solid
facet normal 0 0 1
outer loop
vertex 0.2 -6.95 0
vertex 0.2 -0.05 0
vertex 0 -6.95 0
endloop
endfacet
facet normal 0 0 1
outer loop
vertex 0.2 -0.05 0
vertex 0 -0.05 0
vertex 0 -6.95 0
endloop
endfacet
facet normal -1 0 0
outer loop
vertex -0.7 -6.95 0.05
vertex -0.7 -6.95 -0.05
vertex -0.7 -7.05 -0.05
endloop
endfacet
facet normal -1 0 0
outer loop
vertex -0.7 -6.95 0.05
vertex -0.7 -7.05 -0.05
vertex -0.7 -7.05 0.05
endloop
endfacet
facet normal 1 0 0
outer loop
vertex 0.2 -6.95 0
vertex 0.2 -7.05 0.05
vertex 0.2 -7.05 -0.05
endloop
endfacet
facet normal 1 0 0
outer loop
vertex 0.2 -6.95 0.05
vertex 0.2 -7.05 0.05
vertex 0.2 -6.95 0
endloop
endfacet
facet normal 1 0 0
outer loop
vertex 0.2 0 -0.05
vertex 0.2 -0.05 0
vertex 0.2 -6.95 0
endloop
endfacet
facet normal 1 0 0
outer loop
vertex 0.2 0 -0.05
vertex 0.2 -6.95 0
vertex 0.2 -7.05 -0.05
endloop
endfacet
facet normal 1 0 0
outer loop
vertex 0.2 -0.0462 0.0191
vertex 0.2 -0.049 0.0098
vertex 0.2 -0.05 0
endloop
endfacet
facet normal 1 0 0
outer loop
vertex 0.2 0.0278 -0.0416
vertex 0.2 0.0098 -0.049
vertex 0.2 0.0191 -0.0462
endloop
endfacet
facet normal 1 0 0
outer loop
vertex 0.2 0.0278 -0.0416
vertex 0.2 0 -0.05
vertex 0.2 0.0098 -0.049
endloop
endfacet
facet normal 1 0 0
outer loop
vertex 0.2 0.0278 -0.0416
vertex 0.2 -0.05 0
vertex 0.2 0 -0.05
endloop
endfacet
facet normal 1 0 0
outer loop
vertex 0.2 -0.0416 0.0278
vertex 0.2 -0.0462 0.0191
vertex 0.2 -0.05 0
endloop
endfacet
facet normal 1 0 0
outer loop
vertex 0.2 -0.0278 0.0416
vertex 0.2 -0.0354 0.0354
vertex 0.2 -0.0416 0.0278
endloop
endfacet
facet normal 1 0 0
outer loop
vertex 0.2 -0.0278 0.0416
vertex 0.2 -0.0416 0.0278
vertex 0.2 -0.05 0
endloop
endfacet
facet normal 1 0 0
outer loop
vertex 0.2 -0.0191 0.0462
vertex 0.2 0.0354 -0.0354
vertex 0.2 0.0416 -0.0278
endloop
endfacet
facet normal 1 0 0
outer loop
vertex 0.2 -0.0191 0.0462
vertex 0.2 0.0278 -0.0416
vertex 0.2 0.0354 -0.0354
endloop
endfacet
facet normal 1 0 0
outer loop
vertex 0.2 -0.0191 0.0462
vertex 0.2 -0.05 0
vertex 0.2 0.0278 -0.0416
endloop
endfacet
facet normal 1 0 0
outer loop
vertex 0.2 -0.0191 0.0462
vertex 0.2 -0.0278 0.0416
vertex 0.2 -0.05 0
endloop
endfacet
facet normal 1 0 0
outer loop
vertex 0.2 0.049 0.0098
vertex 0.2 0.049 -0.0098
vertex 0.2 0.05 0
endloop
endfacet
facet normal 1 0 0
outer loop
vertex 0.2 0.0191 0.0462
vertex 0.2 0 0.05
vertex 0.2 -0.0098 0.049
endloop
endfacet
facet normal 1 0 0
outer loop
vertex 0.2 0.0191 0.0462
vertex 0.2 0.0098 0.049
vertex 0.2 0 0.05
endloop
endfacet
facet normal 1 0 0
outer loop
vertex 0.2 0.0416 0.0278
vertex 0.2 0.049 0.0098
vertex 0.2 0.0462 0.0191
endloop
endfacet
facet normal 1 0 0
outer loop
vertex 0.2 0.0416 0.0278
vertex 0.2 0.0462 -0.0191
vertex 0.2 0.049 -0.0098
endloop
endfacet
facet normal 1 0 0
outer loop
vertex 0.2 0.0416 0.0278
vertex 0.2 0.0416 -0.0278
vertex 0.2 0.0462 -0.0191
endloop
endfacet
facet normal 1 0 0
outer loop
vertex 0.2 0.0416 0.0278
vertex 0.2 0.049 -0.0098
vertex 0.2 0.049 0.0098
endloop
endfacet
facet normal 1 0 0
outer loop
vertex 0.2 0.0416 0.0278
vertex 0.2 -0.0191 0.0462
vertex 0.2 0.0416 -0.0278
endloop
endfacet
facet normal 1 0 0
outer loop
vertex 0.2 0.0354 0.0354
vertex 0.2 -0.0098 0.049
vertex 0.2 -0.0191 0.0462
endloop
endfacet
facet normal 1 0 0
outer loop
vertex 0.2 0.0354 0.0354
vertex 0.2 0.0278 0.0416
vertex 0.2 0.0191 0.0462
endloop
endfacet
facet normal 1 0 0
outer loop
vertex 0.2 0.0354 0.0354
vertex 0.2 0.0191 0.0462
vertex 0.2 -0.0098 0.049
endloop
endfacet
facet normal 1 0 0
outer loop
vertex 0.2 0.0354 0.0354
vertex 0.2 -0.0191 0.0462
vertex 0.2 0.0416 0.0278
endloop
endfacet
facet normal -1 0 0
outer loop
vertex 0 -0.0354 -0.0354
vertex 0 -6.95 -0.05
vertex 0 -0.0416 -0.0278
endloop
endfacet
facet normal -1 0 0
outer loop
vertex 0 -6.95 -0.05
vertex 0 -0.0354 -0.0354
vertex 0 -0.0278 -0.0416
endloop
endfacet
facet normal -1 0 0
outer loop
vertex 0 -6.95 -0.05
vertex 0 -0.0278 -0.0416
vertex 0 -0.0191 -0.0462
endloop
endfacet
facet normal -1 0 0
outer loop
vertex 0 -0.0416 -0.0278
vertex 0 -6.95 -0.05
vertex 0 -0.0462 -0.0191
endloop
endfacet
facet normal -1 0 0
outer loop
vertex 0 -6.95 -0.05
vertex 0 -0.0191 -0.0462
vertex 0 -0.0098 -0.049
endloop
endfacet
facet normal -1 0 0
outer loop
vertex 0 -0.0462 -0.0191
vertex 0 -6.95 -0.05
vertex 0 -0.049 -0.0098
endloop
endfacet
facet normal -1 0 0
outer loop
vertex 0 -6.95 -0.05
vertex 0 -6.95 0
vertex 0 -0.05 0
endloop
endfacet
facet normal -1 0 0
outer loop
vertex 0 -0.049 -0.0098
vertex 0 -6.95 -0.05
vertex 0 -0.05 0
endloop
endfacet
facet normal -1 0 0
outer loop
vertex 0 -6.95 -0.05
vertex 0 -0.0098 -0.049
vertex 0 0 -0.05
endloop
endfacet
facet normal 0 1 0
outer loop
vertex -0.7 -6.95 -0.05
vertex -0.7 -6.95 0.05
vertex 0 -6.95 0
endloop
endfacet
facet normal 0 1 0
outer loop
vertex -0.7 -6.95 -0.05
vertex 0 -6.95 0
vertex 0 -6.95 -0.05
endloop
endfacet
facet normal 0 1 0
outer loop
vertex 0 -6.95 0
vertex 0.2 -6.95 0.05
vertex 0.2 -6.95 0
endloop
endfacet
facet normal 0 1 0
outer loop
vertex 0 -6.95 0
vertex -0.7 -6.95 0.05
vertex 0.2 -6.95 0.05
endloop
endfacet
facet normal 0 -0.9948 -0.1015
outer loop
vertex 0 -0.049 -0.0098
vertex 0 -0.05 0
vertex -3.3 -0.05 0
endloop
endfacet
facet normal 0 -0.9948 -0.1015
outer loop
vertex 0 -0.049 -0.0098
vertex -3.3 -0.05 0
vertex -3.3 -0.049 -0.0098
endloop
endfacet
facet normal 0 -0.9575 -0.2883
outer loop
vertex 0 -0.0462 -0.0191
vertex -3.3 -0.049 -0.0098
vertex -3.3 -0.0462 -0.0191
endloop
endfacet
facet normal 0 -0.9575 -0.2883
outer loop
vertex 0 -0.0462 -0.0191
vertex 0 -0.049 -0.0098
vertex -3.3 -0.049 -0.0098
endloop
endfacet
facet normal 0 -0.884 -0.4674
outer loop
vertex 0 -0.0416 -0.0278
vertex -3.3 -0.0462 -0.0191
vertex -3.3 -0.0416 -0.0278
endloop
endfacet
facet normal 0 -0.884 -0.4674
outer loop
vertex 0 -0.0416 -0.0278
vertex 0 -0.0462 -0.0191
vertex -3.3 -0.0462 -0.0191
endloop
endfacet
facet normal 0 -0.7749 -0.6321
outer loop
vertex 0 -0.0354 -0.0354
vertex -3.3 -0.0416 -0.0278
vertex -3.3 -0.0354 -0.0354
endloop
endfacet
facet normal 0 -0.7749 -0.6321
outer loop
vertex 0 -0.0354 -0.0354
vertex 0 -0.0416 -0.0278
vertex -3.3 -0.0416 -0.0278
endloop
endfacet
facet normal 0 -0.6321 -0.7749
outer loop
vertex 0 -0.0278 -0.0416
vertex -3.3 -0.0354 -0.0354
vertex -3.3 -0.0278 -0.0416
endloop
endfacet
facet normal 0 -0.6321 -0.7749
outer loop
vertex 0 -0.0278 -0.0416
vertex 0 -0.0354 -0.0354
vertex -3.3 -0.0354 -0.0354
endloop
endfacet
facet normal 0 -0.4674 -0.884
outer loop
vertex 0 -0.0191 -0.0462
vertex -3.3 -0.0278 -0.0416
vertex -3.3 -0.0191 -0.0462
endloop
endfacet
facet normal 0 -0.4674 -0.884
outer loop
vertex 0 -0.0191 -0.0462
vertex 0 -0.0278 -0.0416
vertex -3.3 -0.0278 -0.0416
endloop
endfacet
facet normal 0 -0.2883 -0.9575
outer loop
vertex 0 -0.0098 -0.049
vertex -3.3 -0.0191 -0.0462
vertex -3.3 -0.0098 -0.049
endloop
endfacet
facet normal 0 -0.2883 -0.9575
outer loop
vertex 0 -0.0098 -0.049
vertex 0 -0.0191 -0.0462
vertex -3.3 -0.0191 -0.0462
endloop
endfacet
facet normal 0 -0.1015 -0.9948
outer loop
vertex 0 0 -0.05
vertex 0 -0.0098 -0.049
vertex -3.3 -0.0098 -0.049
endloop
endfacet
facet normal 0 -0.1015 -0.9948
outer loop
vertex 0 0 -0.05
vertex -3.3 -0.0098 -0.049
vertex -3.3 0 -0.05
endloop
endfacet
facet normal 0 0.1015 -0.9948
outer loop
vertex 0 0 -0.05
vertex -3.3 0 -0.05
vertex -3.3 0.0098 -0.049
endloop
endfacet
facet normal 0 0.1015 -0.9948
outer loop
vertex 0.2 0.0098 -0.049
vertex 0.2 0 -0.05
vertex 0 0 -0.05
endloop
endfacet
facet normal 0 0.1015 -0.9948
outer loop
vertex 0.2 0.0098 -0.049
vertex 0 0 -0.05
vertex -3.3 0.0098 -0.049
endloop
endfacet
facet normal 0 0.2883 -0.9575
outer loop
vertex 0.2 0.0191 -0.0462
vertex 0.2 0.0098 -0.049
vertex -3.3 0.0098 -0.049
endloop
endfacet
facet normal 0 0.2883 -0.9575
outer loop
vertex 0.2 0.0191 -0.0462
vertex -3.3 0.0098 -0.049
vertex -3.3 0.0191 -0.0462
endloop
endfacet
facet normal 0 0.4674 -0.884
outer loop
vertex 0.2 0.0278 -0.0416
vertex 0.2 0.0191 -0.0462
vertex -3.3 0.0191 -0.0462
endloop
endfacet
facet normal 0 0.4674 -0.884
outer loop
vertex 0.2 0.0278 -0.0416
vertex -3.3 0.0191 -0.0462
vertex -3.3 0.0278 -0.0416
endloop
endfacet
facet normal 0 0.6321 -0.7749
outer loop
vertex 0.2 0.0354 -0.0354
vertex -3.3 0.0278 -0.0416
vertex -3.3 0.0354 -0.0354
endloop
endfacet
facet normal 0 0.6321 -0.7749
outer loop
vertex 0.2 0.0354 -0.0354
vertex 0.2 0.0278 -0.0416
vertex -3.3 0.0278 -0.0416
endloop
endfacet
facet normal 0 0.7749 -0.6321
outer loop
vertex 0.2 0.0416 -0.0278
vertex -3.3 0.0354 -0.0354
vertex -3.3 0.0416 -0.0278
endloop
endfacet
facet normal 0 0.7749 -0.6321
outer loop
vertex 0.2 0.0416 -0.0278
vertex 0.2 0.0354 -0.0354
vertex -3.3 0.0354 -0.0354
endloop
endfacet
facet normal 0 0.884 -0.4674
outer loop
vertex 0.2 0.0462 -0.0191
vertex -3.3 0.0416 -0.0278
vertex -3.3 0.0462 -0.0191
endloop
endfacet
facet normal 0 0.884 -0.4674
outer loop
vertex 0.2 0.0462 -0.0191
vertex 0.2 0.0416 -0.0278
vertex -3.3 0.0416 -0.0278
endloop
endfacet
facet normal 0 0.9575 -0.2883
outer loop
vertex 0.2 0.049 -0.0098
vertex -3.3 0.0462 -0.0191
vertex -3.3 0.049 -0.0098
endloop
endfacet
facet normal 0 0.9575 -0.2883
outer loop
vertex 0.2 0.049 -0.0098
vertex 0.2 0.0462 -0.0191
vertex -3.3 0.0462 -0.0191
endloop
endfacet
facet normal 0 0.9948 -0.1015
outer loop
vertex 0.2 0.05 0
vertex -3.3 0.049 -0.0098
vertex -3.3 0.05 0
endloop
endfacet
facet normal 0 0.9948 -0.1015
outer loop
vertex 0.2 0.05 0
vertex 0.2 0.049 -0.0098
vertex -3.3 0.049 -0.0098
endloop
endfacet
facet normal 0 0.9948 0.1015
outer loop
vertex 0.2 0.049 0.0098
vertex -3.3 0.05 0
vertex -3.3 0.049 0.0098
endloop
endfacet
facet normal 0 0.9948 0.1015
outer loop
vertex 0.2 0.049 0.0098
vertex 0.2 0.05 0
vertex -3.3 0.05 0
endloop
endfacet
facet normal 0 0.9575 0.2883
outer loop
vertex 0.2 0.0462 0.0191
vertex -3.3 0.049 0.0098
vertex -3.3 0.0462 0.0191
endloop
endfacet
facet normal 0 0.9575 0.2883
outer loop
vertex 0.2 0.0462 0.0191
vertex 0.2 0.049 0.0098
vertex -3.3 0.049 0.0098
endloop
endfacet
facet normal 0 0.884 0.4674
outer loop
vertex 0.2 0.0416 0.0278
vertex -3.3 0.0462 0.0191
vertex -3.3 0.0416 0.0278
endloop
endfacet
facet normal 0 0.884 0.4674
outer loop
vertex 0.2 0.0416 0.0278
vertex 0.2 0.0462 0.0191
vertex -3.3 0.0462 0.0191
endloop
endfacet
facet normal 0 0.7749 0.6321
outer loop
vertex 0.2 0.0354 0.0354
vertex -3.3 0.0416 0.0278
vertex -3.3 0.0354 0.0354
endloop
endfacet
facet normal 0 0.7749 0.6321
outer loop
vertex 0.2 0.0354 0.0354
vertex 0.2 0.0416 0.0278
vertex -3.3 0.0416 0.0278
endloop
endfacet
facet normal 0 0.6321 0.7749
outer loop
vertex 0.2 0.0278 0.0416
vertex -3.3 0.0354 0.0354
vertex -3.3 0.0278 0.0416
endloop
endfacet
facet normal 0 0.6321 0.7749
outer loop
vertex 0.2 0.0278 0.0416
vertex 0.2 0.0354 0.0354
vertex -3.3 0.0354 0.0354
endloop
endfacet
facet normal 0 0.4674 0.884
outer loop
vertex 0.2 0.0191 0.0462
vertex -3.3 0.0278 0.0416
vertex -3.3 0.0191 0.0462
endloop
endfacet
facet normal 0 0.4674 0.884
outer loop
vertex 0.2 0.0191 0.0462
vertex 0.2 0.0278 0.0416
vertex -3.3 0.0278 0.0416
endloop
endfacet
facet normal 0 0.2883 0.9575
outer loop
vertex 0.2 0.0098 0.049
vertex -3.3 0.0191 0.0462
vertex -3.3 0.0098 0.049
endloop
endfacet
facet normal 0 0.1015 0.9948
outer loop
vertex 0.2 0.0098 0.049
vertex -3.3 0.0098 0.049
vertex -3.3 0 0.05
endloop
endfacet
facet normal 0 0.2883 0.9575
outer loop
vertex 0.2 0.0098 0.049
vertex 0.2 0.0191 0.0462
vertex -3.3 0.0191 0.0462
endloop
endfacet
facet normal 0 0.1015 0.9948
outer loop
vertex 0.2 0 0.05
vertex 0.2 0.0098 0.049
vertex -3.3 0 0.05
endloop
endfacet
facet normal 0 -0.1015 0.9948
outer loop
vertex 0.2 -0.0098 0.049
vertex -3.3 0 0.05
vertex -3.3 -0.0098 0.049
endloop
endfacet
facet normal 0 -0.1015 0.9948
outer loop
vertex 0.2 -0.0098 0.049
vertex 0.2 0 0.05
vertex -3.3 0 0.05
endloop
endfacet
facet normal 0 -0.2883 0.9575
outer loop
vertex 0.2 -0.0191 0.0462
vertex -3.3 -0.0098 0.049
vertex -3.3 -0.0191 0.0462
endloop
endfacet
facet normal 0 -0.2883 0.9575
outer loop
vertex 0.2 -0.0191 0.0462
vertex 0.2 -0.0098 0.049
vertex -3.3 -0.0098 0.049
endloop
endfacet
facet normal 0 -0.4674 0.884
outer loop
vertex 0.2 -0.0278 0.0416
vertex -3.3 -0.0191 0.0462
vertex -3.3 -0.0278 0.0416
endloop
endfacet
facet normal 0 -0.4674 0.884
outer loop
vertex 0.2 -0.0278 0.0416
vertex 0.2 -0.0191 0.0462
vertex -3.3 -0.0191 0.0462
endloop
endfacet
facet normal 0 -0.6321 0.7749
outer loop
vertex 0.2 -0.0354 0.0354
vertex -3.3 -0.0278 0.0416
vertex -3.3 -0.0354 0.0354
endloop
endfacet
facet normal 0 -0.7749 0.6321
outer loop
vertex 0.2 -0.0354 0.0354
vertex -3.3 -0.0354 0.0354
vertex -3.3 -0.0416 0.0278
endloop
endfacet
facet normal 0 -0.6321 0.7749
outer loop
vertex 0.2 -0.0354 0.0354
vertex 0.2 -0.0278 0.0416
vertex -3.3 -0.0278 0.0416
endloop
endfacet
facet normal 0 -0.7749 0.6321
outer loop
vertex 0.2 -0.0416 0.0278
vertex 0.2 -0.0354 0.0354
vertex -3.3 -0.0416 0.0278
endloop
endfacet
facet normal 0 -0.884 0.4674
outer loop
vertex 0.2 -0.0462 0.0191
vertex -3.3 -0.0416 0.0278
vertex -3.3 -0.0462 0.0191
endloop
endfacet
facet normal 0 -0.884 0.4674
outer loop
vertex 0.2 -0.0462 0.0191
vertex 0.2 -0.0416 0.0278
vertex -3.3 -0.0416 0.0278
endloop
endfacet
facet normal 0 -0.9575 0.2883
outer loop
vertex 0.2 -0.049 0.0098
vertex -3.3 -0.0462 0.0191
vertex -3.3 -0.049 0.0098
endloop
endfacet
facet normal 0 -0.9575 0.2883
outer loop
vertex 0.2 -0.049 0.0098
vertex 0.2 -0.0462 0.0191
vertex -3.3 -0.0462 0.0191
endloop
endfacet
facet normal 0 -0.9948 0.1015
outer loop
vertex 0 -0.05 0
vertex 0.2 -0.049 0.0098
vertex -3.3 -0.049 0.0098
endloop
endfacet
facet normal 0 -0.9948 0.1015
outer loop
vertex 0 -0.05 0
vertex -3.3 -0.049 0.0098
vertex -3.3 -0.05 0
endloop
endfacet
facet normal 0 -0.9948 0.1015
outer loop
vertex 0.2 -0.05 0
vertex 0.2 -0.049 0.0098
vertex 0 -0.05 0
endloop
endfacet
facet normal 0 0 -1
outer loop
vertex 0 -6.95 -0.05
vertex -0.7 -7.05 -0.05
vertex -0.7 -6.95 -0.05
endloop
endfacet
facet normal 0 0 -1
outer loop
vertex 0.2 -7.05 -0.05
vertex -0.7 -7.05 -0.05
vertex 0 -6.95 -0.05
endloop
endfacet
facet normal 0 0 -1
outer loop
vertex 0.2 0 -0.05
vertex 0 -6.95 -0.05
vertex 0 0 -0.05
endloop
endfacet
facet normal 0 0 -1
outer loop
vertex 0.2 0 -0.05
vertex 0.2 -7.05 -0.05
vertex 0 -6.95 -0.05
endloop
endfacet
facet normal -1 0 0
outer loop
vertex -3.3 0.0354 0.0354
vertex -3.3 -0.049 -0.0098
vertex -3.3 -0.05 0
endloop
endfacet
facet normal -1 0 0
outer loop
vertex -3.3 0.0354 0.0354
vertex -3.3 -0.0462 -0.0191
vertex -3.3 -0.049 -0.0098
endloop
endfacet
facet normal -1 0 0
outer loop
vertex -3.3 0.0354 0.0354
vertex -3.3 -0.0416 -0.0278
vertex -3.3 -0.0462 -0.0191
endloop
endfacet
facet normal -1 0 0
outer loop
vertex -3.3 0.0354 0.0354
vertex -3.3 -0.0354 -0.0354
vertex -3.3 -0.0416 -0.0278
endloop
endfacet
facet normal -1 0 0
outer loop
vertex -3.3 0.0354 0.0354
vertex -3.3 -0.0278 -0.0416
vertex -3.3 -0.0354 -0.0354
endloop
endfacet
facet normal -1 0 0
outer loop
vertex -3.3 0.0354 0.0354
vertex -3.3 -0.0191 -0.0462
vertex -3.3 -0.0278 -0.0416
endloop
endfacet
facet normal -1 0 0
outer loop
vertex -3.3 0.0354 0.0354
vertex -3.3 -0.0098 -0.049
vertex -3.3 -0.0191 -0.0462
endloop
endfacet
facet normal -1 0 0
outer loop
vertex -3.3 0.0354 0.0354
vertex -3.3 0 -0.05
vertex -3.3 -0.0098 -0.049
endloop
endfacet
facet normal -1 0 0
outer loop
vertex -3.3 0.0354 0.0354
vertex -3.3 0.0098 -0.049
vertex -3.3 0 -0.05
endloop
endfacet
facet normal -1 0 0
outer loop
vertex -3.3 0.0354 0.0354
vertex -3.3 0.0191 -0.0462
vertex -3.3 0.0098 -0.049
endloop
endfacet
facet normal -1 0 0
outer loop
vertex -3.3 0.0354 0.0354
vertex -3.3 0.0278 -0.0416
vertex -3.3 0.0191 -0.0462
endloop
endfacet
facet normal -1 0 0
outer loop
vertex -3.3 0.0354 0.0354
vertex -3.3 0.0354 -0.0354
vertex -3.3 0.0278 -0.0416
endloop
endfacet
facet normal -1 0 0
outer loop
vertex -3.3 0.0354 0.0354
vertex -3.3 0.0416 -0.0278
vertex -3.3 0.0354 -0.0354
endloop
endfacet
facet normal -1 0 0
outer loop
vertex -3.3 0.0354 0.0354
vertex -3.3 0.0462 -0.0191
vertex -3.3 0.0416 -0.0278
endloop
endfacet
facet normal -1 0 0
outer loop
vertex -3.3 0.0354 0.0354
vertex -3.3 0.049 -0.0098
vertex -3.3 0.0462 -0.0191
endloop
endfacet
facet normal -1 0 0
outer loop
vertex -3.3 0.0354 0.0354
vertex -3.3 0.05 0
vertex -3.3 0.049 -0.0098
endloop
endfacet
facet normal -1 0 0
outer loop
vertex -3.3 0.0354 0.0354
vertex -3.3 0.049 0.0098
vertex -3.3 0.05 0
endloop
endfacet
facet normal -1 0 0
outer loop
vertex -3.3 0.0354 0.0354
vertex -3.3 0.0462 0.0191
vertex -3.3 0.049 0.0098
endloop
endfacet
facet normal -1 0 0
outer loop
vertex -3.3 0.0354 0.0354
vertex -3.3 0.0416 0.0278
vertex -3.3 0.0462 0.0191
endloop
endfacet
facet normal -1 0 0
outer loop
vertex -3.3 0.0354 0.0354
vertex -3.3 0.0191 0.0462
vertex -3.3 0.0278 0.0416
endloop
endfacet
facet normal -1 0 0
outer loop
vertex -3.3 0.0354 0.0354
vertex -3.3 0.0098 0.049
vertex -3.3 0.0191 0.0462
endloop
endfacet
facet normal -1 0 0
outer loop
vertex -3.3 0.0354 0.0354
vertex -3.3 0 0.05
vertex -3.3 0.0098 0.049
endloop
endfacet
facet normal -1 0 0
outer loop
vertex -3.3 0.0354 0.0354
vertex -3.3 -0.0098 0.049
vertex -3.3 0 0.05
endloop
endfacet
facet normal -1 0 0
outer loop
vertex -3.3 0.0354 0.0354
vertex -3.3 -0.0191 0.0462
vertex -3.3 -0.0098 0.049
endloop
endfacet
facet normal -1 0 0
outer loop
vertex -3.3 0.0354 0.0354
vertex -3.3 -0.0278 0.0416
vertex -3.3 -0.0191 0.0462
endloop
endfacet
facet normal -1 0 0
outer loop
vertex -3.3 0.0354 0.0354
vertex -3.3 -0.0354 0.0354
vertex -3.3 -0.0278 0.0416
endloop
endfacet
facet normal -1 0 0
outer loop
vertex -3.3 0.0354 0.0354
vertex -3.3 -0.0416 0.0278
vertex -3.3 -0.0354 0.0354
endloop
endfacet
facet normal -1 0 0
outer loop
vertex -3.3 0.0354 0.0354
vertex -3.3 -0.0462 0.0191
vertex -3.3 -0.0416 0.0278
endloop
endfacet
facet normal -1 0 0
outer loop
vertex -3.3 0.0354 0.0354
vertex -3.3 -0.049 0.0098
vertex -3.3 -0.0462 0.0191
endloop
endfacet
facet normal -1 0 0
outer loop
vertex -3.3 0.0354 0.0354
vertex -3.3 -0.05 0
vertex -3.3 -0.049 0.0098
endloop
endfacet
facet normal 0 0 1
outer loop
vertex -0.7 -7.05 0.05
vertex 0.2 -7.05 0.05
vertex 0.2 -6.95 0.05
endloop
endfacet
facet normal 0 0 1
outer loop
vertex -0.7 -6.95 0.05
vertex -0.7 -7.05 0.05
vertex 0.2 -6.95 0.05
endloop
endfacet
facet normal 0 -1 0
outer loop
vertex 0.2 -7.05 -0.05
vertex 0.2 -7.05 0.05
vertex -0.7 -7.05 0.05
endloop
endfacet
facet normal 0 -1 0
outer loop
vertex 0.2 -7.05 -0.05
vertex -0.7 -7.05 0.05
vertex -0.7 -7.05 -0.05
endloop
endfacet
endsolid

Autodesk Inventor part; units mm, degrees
ref_plane "YZ Plane" through (0, 0, 0) normal (1, 0, 0) x (0, 1, 0)
ref_plane "XZ Plane" through (0, 0, 0) normal (0, 1, 0) x (-1, 0, 0)
ref_plane "XY Plane" through (0, 0, 0) normal (0, 0, 1) x (1, 0, 0)
sketch "Sketch1" plane through (0, 0, 0) normal (1, 0, 0) x (0, 1, 0)
  circle A0 centre (0, 0) radius 0.05
  line L0 (0, 0) -> (-7, 0)
  line L1 (-7.05, 0.05) -> (-6.95, 0.05)
  line L2 (-6.95, 0.05) -> (-6.95, -0.05)
  line L3 (-6.95, -0.05) -> (-7.05, -0.05)
  line L4 (-7.05, -0.05) -> (-7.05, 0.05)
  line L5 (-7.05, 0.05) -> (-6.95, -0.05) construction
  line L6 (-6.95, 0.05) -> (-7.05, -0.05) construction
  line L7 (-6.95, -0.05) -> (0, -0.05)
  point P0 (-0.05, 0)
  point P1 (-6.95, 0)
  dimension "d0" = 0.1
  dimension "d1" = 7
  dimension "d2" = 0.1
  dimension "d3" = 0.1
extrude "Extrusion1" add sketch "Sketch1" along normal blind 0.2
sketch "Sketch2" plane through (0, 0, 0) normal (-1, 0, 0) x (0, 0, 1)
  arc A0 (0, -0.05) -> (-0.05, 0) centre (0, 0) ccw projected
  circle A1 centre (0, 0) radius 0.05
  point P0 (-0.05, 0)
  point P1 (0, -0.05)
  dimension "d6" = 0.1
extrude "Extrusion2" add sketch "Sketch2" along normal blind 3.3
sketch "Sketch3" plane through (0, 0, 0) normal (-1, 0, 0) x (0, 0, 1)
  line L0 (-0.05, -7.05) -> (-0.05, 0) projected
  line L1 (0.05, -7.05) -> (-0.05, -7.05) projected
  line L2 (-0.05, -7.05) -> (0.05, -7.05)
  line L3 (0, -6.95) -> (0.05, -6.95) projected
  line L4 (0.05, -7.05) -> (0.05, -6.95)
  line L5 (0.05, -6.95) -> (-0.05, -6.95)
  line L6 (-0.05, -6.95) -> (-0.05, -7.05)
  point P0 (0, 0)
extrude "Extrusion3" add sketch "Sketch3" along normal blind 0.7
properties part number "Bone25_13_Fix"
